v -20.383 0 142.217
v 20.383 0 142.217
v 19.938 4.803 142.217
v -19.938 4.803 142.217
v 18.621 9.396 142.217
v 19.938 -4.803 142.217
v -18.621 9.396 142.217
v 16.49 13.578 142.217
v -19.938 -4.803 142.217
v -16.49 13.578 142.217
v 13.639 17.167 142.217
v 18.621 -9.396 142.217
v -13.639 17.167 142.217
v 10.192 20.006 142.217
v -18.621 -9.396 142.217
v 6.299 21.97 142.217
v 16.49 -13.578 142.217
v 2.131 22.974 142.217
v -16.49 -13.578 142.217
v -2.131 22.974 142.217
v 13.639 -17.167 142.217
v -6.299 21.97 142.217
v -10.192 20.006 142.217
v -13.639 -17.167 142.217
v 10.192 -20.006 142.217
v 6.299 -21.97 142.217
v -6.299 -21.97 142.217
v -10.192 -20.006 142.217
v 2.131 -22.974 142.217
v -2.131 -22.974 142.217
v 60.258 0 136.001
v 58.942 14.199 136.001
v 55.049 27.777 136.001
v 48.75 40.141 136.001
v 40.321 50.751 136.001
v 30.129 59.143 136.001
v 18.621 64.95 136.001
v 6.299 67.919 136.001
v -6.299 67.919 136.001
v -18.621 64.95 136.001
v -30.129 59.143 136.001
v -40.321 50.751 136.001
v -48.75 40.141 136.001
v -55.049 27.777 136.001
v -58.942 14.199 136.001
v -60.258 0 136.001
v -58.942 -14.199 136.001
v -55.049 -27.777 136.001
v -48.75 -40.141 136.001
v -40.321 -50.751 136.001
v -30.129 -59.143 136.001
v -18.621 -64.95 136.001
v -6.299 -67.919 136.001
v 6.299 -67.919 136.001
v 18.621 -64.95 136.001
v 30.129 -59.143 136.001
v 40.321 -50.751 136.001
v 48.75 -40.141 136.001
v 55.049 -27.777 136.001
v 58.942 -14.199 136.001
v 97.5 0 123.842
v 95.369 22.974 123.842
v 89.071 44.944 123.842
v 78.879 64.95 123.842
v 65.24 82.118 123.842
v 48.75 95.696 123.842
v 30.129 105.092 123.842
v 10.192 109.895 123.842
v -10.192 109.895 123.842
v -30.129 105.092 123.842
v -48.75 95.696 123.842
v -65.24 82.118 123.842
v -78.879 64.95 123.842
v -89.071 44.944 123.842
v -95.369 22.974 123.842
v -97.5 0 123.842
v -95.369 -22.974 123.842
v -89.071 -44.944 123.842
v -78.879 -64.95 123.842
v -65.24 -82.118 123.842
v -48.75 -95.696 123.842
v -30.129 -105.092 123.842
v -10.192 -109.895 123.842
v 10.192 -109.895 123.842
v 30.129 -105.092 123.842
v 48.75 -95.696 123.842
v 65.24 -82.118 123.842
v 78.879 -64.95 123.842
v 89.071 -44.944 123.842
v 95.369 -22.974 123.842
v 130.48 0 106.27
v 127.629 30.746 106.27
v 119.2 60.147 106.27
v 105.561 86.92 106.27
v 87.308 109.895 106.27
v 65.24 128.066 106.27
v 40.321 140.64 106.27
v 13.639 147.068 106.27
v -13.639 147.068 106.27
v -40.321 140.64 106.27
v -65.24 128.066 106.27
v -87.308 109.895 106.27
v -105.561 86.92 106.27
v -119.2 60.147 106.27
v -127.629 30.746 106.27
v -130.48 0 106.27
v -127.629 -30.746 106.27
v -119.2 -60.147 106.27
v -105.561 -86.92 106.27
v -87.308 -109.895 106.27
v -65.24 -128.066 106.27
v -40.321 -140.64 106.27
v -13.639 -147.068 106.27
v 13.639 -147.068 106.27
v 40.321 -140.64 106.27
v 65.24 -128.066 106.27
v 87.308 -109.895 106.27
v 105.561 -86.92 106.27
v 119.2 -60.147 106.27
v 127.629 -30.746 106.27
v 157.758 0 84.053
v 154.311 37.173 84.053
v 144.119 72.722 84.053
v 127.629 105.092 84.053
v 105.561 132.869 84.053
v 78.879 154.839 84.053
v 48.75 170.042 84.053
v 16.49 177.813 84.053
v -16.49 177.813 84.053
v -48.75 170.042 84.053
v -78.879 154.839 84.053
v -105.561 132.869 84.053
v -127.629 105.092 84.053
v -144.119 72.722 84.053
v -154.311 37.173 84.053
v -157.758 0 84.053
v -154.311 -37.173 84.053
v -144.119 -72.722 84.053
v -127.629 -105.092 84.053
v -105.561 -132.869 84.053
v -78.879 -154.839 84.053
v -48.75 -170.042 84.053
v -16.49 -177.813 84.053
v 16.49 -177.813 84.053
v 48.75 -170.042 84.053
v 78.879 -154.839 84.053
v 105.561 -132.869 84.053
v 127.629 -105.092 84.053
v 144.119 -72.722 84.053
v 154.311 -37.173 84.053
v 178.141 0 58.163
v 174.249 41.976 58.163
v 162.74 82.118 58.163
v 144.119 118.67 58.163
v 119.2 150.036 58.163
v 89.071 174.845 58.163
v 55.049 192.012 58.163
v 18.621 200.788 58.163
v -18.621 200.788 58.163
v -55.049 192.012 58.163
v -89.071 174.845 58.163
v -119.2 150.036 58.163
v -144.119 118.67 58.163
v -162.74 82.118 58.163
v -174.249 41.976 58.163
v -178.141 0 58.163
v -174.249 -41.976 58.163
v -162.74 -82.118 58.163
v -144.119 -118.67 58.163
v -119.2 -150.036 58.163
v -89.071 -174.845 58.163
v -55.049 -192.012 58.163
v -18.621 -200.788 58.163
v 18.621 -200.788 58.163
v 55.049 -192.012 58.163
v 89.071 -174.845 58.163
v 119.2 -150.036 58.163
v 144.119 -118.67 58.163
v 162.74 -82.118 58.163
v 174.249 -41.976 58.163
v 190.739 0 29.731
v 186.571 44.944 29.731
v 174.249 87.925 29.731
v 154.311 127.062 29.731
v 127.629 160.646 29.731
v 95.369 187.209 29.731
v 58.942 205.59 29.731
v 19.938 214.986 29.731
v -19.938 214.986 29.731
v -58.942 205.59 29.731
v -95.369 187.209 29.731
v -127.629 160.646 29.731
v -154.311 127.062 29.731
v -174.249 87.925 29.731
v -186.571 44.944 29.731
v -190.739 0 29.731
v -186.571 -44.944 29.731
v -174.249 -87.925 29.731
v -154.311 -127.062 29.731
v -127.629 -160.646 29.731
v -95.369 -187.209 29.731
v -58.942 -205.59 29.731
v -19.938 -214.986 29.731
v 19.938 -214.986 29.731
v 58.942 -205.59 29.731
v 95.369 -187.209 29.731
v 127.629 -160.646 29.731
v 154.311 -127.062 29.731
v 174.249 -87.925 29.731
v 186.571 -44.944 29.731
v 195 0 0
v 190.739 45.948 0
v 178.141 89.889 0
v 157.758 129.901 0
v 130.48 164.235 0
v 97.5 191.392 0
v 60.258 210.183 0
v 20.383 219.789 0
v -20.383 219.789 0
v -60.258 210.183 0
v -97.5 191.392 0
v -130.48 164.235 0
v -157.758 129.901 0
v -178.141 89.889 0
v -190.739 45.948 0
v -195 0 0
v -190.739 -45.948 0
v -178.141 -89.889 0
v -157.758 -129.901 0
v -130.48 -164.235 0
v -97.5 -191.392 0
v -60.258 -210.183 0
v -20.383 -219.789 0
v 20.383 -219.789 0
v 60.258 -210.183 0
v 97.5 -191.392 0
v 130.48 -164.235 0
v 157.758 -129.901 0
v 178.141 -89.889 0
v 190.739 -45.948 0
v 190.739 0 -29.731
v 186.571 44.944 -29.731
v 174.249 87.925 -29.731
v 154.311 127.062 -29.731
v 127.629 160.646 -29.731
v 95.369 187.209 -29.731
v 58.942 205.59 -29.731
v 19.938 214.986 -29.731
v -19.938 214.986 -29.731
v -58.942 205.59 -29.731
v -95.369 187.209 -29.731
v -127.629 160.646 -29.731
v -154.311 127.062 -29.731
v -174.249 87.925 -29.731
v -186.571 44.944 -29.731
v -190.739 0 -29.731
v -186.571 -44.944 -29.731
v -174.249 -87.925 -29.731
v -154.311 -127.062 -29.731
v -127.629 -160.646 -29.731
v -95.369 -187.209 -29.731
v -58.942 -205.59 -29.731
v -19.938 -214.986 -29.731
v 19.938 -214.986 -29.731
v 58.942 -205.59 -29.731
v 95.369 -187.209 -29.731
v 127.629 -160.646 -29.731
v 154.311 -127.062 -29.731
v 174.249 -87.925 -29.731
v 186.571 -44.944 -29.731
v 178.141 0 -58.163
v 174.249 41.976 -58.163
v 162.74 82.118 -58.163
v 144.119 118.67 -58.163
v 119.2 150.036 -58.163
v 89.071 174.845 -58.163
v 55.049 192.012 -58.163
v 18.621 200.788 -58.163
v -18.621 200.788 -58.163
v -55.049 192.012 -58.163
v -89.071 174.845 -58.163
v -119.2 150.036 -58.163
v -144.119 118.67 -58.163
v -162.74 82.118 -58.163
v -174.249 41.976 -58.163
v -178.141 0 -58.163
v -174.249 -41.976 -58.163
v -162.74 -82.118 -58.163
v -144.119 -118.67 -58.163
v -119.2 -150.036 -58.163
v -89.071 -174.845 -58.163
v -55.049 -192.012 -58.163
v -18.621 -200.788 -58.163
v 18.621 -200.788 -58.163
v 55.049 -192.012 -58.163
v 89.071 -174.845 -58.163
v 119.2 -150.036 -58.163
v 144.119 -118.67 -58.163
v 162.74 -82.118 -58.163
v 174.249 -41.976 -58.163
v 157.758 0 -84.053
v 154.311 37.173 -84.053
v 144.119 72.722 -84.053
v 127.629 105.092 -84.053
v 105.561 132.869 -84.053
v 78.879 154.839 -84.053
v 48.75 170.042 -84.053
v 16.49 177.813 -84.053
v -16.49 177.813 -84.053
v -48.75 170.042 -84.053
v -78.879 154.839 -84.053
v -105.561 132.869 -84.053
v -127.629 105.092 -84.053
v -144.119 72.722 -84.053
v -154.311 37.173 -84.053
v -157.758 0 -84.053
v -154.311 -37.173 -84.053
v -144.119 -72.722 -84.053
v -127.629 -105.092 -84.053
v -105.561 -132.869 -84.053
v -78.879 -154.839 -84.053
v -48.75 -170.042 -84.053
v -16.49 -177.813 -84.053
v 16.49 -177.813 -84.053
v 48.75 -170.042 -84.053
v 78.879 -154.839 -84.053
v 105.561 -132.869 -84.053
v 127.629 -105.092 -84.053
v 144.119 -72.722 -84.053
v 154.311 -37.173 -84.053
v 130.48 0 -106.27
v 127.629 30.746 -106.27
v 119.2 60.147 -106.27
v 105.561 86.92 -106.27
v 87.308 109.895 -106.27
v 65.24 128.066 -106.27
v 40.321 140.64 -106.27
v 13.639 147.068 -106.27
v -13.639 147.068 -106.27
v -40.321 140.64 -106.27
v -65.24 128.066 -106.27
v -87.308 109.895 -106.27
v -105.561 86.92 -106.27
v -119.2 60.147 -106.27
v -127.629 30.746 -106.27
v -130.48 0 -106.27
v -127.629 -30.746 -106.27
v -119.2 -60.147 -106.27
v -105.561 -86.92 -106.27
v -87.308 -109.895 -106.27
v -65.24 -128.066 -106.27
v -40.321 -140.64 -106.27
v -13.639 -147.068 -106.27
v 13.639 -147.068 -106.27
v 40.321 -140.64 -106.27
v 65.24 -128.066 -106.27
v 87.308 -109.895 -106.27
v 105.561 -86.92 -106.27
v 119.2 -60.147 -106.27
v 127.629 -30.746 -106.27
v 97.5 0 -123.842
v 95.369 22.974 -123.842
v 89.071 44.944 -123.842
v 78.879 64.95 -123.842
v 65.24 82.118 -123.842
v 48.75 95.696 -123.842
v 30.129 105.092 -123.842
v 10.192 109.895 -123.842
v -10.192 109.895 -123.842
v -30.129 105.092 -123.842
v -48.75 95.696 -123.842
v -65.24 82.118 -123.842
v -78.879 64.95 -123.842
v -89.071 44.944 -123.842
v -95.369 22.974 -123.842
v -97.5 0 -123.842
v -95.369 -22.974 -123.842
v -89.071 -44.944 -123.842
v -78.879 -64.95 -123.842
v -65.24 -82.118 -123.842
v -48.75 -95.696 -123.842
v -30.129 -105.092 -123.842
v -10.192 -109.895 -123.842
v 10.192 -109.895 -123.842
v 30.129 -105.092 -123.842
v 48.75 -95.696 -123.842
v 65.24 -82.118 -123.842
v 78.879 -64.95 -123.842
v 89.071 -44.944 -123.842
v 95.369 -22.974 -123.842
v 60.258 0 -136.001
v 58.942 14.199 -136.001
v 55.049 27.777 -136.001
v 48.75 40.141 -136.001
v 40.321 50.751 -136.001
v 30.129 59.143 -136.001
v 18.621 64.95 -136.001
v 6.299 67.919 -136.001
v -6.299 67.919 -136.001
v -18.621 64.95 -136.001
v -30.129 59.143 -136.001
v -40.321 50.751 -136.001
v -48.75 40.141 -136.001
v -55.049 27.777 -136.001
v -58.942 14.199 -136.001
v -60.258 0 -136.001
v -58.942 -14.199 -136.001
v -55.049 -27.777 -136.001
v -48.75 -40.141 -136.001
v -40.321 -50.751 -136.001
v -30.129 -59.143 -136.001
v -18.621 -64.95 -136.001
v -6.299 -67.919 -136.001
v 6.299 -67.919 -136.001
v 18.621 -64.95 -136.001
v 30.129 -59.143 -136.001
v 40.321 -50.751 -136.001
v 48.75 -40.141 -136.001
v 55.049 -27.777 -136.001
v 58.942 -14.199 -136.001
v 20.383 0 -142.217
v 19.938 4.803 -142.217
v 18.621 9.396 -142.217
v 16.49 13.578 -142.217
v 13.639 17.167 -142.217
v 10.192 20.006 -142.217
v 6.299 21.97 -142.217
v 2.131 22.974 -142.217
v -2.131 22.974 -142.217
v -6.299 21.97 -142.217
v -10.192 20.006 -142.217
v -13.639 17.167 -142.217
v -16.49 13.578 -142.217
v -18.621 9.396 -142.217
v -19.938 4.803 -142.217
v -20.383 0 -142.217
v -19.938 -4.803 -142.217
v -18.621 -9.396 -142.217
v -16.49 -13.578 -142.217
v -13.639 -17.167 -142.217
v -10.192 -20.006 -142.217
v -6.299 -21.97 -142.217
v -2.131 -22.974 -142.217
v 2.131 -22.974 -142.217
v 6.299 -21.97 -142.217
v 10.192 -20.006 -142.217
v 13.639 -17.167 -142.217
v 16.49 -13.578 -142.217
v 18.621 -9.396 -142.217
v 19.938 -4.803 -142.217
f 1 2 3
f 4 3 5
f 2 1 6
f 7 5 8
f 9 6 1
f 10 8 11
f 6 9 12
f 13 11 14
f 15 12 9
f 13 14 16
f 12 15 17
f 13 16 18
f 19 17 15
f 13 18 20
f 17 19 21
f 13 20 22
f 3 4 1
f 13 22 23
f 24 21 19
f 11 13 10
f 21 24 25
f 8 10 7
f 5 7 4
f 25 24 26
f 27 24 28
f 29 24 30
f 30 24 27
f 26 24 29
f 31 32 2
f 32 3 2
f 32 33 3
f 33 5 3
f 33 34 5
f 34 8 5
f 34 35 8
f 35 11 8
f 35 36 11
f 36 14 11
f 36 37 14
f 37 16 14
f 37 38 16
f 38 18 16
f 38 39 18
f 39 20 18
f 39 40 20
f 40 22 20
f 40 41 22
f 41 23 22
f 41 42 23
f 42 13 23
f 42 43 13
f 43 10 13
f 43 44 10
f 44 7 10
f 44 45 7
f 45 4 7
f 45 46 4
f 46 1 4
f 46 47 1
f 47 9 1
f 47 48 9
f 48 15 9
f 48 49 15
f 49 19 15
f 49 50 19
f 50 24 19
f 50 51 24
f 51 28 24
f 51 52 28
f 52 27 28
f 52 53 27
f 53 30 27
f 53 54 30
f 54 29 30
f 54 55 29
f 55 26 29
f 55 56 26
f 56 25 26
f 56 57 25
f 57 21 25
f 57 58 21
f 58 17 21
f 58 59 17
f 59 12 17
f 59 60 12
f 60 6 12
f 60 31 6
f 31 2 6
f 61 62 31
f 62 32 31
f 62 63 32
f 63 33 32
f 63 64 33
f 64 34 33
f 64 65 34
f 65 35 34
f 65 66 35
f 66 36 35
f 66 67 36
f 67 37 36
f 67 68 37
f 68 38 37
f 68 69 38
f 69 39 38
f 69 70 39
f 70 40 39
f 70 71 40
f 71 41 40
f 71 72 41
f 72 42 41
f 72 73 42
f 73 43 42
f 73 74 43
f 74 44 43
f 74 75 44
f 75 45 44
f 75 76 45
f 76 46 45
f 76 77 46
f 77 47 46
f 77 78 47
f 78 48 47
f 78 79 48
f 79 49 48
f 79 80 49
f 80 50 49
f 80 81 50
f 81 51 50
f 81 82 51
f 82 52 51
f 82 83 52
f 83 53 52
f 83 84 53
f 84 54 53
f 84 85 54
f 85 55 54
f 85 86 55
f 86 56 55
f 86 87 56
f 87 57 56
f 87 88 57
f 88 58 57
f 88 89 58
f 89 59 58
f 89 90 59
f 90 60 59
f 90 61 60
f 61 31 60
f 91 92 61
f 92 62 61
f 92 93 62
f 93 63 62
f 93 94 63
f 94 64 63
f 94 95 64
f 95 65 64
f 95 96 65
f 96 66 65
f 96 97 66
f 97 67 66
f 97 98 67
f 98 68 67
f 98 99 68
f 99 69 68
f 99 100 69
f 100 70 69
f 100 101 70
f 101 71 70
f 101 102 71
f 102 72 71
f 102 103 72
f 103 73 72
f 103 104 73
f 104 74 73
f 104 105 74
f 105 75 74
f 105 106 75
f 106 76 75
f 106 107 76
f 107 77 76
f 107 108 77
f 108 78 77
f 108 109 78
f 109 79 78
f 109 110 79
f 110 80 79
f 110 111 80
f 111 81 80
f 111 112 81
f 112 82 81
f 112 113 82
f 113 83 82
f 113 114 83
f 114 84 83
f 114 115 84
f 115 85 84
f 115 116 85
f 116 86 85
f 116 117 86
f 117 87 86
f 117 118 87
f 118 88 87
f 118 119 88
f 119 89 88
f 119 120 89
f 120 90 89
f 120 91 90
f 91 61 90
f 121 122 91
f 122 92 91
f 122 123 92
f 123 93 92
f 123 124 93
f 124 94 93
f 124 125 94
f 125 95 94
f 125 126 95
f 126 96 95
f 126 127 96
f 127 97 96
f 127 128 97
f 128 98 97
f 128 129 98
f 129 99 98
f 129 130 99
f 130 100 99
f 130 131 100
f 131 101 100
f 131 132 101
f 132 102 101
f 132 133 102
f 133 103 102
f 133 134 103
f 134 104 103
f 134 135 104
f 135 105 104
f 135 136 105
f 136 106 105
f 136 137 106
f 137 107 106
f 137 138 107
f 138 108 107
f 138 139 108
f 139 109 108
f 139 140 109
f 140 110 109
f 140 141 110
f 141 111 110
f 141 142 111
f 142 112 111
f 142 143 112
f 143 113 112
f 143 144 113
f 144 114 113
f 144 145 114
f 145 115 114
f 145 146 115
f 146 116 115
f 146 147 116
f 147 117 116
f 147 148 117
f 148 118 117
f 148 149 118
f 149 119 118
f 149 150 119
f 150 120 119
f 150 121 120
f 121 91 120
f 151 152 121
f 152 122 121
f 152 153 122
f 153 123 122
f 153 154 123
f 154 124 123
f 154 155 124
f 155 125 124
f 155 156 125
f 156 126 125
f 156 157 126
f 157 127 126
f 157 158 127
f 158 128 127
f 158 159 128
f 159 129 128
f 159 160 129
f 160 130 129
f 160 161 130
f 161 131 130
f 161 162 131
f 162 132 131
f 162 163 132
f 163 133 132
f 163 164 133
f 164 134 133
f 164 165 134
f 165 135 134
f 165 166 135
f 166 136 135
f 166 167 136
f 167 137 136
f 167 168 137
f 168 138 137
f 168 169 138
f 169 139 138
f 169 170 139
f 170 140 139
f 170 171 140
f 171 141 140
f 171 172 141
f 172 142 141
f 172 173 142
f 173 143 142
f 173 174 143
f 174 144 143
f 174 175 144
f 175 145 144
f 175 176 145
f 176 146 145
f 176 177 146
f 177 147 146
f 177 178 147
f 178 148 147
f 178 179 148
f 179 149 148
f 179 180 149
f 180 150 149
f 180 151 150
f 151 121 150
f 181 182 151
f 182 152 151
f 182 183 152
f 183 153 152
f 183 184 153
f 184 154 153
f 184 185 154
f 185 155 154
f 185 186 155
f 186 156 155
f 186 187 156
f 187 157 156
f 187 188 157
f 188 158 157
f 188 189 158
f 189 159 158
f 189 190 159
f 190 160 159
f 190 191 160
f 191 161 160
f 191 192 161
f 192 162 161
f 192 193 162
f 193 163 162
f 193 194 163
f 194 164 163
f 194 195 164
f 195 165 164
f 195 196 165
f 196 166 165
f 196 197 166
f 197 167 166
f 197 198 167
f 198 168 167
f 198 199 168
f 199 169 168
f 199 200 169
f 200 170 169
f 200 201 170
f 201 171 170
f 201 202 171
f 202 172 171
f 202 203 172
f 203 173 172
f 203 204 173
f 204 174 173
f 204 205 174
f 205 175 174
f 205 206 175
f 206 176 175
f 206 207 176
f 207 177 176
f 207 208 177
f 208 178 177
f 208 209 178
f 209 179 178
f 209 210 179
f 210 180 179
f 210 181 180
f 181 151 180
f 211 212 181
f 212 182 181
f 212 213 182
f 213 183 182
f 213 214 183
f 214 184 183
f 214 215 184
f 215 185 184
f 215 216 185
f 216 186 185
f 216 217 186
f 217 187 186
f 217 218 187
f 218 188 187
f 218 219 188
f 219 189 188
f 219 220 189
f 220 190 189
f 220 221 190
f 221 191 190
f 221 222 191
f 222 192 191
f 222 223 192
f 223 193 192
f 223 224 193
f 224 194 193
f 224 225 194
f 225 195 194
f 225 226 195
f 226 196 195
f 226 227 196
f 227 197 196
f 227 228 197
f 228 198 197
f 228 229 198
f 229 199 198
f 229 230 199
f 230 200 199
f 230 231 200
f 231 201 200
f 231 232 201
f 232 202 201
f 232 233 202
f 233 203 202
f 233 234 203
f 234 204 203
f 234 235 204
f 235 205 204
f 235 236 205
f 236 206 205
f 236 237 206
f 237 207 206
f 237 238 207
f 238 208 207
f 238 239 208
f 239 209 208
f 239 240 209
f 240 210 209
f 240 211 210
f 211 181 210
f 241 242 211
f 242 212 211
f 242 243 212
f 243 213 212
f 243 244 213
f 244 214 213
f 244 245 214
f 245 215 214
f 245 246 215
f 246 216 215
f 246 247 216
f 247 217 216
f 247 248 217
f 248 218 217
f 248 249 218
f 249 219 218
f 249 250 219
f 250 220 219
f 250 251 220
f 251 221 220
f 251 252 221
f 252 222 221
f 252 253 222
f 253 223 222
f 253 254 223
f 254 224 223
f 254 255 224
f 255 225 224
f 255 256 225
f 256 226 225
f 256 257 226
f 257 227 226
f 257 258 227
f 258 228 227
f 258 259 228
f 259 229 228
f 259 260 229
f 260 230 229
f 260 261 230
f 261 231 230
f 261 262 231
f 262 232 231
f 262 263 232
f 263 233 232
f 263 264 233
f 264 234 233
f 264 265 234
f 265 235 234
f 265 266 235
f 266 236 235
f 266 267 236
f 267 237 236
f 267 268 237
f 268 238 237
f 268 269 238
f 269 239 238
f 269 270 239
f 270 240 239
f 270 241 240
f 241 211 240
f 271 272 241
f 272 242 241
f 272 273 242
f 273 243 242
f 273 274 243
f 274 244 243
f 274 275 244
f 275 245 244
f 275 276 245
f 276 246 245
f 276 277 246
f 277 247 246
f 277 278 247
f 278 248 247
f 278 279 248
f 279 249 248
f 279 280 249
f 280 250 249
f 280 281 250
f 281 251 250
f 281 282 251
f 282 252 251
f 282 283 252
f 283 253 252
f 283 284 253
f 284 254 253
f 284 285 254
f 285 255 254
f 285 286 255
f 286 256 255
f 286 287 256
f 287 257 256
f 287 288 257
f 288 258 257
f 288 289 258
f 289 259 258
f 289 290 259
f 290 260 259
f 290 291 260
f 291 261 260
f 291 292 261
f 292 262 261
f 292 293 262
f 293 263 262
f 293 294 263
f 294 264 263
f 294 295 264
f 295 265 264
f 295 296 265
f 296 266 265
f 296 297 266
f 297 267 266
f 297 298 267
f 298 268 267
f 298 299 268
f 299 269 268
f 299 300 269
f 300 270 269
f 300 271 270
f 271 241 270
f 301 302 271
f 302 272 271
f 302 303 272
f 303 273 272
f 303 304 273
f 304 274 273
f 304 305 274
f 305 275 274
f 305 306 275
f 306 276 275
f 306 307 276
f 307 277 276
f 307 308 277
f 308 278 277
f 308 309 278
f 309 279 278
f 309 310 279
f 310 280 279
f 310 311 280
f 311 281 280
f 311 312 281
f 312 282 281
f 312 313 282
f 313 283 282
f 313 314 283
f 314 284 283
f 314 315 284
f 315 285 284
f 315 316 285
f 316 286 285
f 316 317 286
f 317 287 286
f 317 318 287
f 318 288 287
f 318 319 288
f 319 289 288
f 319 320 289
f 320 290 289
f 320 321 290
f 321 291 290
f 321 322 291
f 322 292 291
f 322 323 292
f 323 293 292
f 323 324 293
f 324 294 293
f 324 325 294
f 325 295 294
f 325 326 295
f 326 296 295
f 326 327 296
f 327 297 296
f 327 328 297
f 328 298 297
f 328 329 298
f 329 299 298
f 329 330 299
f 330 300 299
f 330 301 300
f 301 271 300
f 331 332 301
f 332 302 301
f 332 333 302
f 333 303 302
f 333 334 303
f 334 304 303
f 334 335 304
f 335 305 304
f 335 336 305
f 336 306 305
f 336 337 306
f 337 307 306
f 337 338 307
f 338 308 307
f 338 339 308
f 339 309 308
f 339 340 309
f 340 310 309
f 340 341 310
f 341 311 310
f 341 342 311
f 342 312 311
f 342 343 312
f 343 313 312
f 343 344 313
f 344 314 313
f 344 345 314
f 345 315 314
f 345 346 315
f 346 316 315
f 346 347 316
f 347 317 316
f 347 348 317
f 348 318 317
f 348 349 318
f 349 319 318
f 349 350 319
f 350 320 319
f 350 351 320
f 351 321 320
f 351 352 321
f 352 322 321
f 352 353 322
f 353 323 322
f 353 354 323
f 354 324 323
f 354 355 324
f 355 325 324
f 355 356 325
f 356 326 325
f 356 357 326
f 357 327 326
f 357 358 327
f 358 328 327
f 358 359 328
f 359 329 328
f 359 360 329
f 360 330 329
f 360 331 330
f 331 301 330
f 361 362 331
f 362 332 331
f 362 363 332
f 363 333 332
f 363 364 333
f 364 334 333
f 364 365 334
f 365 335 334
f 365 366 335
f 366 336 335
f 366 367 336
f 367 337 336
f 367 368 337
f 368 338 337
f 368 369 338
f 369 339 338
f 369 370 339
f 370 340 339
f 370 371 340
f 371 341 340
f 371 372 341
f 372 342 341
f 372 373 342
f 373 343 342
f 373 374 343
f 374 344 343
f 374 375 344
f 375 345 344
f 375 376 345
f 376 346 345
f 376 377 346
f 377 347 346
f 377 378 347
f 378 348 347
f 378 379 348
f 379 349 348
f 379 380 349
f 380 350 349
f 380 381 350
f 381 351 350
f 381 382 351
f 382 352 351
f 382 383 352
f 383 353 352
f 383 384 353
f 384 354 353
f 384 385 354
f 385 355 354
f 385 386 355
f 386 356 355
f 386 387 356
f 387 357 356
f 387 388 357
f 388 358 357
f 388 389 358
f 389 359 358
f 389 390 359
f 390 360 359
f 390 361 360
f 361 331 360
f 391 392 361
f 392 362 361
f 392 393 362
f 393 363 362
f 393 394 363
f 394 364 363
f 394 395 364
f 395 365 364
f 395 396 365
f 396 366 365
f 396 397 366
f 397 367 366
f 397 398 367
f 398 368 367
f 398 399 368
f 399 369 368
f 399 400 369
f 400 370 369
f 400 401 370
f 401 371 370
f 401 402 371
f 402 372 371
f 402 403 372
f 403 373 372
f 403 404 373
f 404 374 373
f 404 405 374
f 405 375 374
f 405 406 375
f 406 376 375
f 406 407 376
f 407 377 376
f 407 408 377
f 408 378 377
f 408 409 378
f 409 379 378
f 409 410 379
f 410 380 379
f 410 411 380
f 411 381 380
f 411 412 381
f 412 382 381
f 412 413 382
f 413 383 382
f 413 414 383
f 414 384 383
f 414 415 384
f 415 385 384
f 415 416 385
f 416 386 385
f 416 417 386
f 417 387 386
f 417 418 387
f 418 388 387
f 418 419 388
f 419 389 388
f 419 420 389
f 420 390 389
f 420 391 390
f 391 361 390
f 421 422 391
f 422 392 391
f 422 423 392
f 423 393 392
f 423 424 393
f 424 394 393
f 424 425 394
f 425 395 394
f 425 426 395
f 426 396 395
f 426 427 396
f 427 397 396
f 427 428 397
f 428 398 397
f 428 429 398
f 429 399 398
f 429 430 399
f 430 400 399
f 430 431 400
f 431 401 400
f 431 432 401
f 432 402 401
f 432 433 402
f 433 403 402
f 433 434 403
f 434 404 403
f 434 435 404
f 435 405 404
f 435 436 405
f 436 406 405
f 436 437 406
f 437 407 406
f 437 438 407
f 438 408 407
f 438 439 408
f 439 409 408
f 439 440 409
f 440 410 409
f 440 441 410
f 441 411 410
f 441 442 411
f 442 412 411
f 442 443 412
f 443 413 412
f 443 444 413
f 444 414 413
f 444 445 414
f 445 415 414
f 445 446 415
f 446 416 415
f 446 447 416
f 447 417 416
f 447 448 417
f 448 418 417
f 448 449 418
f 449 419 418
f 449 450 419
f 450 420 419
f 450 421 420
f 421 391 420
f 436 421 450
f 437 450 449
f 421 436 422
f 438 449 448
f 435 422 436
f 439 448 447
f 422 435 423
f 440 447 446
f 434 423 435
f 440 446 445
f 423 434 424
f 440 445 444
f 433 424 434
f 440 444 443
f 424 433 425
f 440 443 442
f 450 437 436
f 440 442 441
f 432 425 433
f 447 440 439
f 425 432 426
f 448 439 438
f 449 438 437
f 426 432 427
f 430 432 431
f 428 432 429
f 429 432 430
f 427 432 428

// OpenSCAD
// Generated by SolidPython 1.0.1 on 2020-07-29 00:46:52


scale(v = [15, 17, 11]) {
	sphere(r = 13);
}
/***********************************************
*********      SolidPython code:      **********
************************************************
 
# import packages: SolidPython
from solid import *
from solid.utils import *
from itertools import chain, combinations, permutations


class Resize:

    def __init__(self, scad_file):
        self.scad_file = scad_file
        #self.scad_file = import_scad(scad_file)
        # cone/cylinder param:
        self.r1 = 0
        self.r2 = 0
        self.h = 0
        # rectangular prism param:
        self.w = 0
        self.l = 0
        # ellipse param:
        self.r = 0

    # import OpenScad code (file name corresponds to shape)


    # classify shape + parameters
    def assign(self, param1, param2, param3):
        if self.scad_file == 'cone.scad':
            self.r1 = param1
            self.r2 = param2
            self.h = param3
        elif self.scad_file == 'cylinder.scad':
            self.r1 = param1
            self.r2 = param2
            self.h = param3
        elif self.scad_file == 'rectangularPrism.scad':
            self.h = param1
            self.l = param2
            self.w = param3
        else:
            self.r = param1
            self.h = param2

    # resize parameters
    def iterate(self):
        x = range(3, 20, 2)
        i = 1
        if self.scad_file == 'cone.scad':
            tempList = list(permutations(x, 2))
            for temp in tempList:
                param1 = temp[0]
                param2 = temp[1]
                filepath = 'produced_scad_files/' + 'cone' + str(param1) + '_' + str(param2) + '_' + '.scad'
                scad_render_to_file(cylinder(h=param1, r1=param2, r2=0), filepath)

        elif self.scad_file == 'cylinder.scad':
            tempList = list(permutations(x, 3))
            for temp in tempList:
                param1 = temp[0]
                param2 = temp[1]
                filepath = 'produced_scad_files/' + 'cylinder' + str(param1) + '_' + str(param2) + '_' + '.scad'
                scad_render_to_file(cylinder(h=param1, r1=param2, r2=param2), filepath)

        elif self.scad_file == 'rectangularPrism.scad':
            tempList = list(permutations(x, 3))
            for temp in tempList:
                param1 = temp[0]
                param2 = temp[1]
                param3 = temp[2]
                filepath = 'produced_scad_files/' + 'rectangularPrism' + str(param1) + '_' + str(param2) + '_' + str(
                    param3) + '.scad'
                scad_render_to_file(cube(size=(param1, param2, param3)), filepath)

        elif self.scad_file == 'ellipse.scad':
            tempList = list(permutations(x, 4))
            for temp in tempList:
                param1 = temp[0]
                param2 = temp[1]
                param3 = temp[2]
                param4 = temp[3]
                filepath = 'produced_scad_files/' + 'ellipse' + str(param1) + '_' + str(param2) + '_' + str(param3) + '_' + str(param4) + '.scad'
                scad_render_to_file(scale([param1, param2, param3])(sphere(r=param4)), filepath)

    def render_to_scadfile(self):
        scad_render_to_file(scad, 'example.scad') 
 
************************************************/
